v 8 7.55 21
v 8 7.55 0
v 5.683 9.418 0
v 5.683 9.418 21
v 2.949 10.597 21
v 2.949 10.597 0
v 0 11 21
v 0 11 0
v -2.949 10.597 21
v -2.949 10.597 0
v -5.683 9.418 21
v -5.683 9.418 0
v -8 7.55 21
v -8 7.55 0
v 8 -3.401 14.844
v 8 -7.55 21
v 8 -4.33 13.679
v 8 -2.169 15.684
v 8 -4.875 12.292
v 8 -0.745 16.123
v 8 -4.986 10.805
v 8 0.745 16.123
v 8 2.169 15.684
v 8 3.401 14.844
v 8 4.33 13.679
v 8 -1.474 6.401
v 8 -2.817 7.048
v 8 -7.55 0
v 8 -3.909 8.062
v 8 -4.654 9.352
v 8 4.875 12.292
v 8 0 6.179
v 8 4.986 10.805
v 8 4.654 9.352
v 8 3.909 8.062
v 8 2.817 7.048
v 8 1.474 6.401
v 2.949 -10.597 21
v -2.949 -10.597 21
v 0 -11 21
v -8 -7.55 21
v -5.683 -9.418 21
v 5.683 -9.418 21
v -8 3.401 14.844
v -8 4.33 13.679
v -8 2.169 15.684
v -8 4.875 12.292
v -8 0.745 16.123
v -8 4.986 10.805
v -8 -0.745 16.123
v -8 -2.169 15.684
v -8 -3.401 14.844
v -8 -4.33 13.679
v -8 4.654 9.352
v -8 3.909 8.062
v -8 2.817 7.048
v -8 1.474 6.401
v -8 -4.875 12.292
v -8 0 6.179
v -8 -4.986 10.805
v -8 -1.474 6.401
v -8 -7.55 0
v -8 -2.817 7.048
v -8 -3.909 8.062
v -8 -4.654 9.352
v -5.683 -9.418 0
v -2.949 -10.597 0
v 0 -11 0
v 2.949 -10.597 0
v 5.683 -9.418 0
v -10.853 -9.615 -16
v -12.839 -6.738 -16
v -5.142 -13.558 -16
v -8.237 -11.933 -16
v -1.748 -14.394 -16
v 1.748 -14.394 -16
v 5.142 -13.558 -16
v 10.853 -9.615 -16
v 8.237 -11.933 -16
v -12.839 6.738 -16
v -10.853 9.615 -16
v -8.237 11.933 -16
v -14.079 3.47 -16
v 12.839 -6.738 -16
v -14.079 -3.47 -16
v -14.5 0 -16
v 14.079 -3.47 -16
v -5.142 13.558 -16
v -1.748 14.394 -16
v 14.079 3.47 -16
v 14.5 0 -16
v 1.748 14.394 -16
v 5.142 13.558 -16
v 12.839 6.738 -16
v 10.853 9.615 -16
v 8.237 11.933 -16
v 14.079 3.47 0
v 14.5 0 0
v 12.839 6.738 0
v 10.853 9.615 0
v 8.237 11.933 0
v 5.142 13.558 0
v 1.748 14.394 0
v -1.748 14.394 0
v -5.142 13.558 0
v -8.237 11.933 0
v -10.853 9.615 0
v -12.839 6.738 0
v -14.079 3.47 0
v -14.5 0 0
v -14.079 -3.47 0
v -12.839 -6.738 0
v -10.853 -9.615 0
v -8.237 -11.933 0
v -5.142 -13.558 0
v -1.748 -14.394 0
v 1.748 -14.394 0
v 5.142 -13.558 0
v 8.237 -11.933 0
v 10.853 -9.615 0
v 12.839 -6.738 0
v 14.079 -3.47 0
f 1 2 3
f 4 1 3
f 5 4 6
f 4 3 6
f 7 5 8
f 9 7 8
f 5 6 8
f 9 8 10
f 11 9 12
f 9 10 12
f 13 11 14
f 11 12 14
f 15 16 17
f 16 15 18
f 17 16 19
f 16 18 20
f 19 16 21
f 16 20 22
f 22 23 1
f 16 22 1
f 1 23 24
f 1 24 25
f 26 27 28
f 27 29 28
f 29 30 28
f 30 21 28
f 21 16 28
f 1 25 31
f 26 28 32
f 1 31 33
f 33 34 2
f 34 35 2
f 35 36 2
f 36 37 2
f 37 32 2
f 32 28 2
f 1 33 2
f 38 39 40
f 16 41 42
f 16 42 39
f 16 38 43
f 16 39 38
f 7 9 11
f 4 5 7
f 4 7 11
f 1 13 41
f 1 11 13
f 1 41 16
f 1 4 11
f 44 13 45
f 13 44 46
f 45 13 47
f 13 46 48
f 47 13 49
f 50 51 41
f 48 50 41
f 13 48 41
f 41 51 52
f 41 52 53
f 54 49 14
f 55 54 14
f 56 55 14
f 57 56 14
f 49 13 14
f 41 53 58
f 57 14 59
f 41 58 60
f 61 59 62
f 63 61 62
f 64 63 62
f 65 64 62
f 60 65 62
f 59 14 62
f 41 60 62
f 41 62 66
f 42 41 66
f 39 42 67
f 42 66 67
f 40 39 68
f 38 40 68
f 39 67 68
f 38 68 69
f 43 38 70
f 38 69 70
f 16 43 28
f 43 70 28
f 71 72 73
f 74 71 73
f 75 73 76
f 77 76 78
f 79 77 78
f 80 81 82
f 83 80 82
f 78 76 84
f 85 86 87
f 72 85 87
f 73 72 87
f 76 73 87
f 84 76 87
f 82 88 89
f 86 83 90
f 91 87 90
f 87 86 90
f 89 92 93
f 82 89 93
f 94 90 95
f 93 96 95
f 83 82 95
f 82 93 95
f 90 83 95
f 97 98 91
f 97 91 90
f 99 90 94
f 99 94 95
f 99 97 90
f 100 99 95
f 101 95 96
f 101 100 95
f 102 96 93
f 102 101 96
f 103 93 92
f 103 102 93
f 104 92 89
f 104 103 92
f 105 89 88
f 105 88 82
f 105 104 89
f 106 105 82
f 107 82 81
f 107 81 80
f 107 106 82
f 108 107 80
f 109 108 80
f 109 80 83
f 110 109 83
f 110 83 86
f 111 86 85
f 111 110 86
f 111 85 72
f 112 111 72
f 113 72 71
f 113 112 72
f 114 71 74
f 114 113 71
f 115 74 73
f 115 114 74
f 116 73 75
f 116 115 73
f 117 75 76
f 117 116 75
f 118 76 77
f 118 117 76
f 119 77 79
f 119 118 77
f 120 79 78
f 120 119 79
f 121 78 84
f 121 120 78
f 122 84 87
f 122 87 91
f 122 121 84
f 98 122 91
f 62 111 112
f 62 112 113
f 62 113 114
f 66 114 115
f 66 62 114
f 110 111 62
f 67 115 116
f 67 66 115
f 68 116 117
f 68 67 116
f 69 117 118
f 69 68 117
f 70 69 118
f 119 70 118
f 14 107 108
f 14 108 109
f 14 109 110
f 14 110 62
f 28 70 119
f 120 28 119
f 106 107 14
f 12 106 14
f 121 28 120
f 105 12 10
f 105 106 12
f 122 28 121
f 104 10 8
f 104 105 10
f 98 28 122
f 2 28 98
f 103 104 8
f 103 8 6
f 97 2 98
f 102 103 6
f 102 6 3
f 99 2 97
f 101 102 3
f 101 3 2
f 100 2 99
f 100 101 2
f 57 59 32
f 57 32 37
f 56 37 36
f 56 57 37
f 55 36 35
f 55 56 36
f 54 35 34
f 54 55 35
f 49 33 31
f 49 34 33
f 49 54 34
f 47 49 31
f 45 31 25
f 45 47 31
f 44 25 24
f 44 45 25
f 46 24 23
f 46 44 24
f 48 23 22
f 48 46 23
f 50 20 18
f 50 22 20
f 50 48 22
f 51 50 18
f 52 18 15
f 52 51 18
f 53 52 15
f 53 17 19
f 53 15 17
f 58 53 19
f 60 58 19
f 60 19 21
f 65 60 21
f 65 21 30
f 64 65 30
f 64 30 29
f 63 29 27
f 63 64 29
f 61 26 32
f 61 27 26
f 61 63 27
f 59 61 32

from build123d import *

# Parameters (mm, degrees)
BOSS_EXTRUDE1_DEPTH     = 21
SKETCH3_R               = 14.5
BOSS_EXTRUDE2_DEPTH     = 16
CUT_EXTRUDE1_DEPTH      = 30.351320243
CUT_EXTRUDE1_DEPTH_BACK = 30.351320243
SKETCH4_R               = 5


with BuildPart() as part:
    # Sketch1 → Boss-Extrude1 (new body)
    with BuildSketch(Plane.XY):
        with BuildLine():
            Line((-8, 7.549834435), (-8, -7.549834435))
            ThreePointArc((-8, -7.549834435), (0, -11), (8, -7.549834435))
            Line((8, -7.549834435), (8, 7.549834435))
            ThreePointArc((8, 7.549834435), (0, 11), (-8, 7.549834435))
        make_face()
    extrude(amount=BOSS_EXTRUDE1_DEPTH)

    # Sketch3 → Boss-Extrude2 (add)
    with BuildSketch(Plane.XY):
        Circle(SKETCH3_R)
    extrude(amount=-BOSS_EXTRUDE2_DEPTH)

    # Sketch4 → Cut-Extrude1 (cut, two sides: drawn at the far end of the back side and taken through both)
    with BuildSketch(Plane(origin=(0, 0, 0), x_dir=(0, 0, -1), z_dir=(1, 0, 0)).offset(-CUT_EXTRUDE1_DEPTH_BACK)):
        with Locations((-11.179145377, 0)):
            Circle(SKETCH4_R)
    extrude(amount=CUT_EXTRUDE1_DEPTH + CUT_EXTRUDE1_DEPTH_BACK, mode=Mode.SUBTRACT)


solid = part.part
